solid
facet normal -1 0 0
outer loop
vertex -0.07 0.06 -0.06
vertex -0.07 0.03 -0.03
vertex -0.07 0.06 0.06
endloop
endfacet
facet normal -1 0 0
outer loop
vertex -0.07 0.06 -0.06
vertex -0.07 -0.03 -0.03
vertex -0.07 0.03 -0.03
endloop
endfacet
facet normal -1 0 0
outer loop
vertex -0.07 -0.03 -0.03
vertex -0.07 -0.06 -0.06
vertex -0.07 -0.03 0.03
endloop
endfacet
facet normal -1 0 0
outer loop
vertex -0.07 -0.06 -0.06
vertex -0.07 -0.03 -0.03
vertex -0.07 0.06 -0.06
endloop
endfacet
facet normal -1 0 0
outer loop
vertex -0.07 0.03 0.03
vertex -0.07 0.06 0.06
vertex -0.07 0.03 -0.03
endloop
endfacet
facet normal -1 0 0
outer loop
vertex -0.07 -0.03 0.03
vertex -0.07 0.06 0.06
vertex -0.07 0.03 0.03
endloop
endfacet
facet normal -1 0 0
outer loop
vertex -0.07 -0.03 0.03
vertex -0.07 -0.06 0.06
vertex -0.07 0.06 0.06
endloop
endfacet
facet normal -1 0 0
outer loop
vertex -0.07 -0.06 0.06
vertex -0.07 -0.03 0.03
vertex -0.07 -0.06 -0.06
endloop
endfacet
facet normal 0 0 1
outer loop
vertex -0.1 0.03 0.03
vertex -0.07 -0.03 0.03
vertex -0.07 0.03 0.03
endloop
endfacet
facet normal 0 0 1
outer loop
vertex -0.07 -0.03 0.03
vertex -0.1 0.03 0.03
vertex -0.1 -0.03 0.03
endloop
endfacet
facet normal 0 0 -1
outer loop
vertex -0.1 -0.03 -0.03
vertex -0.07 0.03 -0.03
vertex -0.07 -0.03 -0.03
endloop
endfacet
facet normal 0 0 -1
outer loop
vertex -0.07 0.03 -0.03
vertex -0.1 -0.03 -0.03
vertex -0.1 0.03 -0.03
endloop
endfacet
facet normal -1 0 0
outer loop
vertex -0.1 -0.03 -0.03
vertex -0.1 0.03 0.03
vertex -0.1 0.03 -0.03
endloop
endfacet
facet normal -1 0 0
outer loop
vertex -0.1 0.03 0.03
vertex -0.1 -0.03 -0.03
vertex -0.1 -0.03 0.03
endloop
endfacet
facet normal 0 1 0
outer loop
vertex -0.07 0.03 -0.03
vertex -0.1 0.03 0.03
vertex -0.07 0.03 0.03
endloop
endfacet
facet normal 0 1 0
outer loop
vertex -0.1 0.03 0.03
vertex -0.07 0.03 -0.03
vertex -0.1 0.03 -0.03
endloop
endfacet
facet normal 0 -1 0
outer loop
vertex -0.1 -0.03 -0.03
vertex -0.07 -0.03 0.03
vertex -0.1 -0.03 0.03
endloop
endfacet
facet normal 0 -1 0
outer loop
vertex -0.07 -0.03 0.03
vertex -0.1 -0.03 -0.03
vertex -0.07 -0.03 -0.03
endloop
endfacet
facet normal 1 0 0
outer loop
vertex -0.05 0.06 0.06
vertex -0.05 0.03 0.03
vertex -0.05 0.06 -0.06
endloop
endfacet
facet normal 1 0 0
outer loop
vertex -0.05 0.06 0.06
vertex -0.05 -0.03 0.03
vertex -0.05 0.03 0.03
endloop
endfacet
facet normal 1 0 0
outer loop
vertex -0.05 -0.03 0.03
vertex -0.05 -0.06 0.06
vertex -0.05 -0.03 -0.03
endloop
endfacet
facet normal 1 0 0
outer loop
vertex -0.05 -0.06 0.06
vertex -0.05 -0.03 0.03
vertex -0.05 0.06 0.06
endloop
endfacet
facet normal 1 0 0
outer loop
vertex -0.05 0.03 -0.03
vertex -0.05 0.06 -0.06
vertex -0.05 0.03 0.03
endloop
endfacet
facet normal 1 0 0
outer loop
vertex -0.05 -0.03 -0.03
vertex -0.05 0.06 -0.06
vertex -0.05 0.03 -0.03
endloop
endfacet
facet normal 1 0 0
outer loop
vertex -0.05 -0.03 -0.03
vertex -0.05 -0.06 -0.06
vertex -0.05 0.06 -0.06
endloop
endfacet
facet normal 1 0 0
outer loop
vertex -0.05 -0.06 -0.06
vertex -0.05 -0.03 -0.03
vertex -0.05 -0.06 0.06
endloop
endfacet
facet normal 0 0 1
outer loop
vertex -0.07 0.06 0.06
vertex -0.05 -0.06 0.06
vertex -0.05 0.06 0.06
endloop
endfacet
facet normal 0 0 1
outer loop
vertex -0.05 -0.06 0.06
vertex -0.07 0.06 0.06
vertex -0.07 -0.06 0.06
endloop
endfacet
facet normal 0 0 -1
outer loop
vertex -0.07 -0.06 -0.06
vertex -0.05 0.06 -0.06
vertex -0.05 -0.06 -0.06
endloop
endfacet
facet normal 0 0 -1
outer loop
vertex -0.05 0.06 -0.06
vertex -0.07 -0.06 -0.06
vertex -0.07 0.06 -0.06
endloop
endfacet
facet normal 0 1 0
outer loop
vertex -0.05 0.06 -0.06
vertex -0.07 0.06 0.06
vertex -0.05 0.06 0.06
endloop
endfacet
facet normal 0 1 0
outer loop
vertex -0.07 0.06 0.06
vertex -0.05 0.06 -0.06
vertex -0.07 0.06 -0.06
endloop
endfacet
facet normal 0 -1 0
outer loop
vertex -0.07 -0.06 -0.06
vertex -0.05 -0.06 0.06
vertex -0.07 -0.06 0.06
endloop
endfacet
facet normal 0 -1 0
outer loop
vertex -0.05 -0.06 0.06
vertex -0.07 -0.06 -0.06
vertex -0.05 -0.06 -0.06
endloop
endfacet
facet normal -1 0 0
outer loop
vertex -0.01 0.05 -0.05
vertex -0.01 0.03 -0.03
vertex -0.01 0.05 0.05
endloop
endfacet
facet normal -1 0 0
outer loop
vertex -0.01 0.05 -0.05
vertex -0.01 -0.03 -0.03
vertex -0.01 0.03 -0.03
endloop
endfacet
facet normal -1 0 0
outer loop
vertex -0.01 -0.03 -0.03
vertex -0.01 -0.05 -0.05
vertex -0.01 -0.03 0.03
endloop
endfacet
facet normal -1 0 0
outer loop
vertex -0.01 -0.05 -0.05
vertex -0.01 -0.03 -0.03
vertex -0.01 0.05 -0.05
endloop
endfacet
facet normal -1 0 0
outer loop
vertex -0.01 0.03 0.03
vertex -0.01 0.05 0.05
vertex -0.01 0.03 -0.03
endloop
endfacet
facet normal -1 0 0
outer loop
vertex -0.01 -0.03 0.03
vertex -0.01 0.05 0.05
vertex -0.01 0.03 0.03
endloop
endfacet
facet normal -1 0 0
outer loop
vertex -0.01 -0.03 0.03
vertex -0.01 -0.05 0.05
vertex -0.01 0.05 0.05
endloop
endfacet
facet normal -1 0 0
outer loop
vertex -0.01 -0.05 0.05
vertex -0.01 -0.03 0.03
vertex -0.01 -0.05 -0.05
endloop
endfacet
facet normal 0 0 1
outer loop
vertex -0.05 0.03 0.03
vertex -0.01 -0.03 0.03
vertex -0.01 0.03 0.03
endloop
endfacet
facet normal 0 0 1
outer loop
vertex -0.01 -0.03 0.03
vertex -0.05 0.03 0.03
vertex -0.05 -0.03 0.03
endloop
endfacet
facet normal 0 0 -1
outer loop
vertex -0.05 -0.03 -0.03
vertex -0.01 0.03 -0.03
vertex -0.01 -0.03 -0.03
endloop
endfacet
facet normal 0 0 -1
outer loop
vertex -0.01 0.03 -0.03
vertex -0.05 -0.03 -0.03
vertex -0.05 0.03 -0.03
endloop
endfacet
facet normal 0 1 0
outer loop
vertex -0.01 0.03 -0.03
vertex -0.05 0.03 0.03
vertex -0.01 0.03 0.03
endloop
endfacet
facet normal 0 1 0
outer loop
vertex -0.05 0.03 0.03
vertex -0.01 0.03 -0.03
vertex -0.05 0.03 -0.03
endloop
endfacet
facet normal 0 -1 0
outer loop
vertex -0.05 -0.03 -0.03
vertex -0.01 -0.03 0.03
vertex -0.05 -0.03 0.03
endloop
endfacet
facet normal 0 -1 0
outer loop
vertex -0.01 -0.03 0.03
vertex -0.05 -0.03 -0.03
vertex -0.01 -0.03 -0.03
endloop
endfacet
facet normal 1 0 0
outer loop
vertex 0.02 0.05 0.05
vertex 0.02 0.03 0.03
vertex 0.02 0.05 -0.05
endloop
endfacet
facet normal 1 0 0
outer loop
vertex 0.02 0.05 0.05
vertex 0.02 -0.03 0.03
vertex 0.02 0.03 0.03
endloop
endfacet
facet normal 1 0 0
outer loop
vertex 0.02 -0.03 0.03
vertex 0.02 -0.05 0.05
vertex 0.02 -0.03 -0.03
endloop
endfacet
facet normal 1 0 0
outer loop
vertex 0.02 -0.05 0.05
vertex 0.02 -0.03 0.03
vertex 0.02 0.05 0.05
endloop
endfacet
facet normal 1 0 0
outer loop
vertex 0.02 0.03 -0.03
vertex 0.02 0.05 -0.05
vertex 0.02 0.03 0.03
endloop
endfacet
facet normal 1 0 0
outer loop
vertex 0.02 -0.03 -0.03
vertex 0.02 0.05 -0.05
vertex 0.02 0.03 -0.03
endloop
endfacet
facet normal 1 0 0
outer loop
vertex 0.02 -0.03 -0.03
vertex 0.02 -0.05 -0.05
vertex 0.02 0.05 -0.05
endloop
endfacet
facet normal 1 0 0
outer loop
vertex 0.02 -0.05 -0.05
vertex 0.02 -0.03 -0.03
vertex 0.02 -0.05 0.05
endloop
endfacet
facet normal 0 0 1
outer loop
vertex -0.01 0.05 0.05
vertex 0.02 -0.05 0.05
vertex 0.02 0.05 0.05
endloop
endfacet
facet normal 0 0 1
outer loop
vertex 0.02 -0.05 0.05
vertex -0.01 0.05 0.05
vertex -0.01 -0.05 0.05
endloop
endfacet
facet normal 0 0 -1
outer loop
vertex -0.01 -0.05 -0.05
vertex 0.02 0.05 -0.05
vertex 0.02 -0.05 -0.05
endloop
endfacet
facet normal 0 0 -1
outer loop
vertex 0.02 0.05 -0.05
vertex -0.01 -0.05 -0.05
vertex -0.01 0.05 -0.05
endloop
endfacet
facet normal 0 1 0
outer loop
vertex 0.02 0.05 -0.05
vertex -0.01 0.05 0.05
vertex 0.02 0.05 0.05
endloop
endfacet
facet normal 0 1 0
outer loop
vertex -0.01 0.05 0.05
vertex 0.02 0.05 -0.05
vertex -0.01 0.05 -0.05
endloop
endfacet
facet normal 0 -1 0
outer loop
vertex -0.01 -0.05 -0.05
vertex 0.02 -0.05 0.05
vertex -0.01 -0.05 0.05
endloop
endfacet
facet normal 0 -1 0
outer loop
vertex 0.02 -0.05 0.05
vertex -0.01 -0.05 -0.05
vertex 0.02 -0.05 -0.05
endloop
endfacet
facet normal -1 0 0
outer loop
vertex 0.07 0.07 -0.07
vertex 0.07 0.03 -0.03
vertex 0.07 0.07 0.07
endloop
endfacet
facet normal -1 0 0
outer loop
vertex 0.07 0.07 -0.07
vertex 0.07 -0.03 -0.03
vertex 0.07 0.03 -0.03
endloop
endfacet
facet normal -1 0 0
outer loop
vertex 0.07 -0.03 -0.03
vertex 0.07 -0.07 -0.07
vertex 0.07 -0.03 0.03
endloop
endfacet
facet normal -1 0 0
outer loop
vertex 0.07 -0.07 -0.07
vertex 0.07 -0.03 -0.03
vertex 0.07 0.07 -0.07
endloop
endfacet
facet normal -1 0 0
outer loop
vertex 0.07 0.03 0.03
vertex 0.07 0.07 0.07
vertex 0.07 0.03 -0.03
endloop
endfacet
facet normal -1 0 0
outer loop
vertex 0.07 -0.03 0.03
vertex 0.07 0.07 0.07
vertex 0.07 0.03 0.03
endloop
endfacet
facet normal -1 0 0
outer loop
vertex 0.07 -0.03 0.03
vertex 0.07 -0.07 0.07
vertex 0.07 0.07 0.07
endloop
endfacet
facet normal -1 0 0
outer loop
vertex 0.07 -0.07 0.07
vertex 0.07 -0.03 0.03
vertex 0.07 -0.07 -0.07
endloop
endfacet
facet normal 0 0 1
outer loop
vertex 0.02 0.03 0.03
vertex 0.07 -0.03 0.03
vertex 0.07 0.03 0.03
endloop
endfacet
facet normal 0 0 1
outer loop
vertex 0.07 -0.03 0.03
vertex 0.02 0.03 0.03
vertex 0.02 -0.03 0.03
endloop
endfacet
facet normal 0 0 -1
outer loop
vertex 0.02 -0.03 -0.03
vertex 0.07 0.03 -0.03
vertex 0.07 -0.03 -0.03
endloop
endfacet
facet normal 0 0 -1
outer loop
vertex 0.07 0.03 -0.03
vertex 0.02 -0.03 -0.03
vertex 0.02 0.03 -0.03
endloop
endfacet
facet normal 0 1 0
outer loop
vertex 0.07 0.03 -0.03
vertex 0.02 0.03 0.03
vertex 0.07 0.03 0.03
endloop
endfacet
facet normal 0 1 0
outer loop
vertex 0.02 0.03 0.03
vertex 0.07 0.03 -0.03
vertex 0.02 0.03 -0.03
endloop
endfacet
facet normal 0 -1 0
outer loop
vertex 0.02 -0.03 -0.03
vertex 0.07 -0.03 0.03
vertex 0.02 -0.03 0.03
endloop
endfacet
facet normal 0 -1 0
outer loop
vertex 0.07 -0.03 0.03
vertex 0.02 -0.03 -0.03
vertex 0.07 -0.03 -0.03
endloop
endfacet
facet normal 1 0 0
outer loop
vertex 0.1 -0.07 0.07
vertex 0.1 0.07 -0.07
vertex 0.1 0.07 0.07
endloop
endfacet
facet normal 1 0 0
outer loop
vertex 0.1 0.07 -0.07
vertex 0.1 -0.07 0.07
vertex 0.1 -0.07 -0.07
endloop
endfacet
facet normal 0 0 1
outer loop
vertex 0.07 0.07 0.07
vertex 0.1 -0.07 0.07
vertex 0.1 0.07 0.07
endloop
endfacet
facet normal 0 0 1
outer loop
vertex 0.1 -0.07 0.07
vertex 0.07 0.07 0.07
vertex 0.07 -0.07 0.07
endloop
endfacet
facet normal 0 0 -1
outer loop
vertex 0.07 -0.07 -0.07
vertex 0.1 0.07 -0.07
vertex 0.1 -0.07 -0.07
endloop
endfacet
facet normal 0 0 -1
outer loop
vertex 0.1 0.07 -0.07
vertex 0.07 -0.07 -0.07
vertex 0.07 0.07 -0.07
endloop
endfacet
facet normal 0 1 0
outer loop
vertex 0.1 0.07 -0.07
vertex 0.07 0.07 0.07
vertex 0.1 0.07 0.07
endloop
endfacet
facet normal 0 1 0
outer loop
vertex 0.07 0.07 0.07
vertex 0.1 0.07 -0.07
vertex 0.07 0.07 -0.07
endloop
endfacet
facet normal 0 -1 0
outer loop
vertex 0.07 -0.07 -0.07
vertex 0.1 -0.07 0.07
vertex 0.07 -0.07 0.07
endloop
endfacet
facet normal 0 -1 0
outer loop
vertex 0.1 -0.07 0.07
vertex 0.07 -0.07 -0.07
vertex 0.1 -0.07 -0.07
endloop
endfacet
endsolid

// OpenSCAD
$fn=64;

module seg(len, w, h){
    translate([0,0,0]) cube([len, w, h], center=false);
}

module stepped_bar(total_len=0.2, base_w=0.06, base_h=0.06){
    // Build along X, centered at origin overall
    // Segment plan (lengths sum to total_len):
    // 0.03 base, 0.02 thick, 0.04 base, 0.03 thick, 0.05 base, 0.03 thick
    l1=0.03; l2=0.02; l3=0.04; l4=0.03; l5=0.05; l6=0.03;
    w2=0.12; h2=0.12;
    w4=0.10; h4=0.10;
    w6=0.14; h6=0.14;

    union(){
        translate([-total_len/2, -base_w/2, -base_h/2]) seg(l1, base_w, base_h);
        translate([-total_len/2 + l1, -w2/2, -h2/2]) seg(l2, w2, h2);
        translate([-total_len/2 + l1 + l2, -base_w/2, -base_h/2]) seg(l3, base_w, base_h);
        translate([-total_len/2 + l1 + l2 + l3, -w4/2, -h4/2]) seg(l4, w4, h4);
        translate([-total_len/2 + l1 + l2 + l3 + l4, -base_w/2, -base_h/2]) seg(l5, base_w, base_h);
        translate([-total_len/2 + l1 + l2 + l3 + l4 + l5, -w6/2, -h6/2]) seg(l6, w6, h6);
    }
}

stepped_bar();
